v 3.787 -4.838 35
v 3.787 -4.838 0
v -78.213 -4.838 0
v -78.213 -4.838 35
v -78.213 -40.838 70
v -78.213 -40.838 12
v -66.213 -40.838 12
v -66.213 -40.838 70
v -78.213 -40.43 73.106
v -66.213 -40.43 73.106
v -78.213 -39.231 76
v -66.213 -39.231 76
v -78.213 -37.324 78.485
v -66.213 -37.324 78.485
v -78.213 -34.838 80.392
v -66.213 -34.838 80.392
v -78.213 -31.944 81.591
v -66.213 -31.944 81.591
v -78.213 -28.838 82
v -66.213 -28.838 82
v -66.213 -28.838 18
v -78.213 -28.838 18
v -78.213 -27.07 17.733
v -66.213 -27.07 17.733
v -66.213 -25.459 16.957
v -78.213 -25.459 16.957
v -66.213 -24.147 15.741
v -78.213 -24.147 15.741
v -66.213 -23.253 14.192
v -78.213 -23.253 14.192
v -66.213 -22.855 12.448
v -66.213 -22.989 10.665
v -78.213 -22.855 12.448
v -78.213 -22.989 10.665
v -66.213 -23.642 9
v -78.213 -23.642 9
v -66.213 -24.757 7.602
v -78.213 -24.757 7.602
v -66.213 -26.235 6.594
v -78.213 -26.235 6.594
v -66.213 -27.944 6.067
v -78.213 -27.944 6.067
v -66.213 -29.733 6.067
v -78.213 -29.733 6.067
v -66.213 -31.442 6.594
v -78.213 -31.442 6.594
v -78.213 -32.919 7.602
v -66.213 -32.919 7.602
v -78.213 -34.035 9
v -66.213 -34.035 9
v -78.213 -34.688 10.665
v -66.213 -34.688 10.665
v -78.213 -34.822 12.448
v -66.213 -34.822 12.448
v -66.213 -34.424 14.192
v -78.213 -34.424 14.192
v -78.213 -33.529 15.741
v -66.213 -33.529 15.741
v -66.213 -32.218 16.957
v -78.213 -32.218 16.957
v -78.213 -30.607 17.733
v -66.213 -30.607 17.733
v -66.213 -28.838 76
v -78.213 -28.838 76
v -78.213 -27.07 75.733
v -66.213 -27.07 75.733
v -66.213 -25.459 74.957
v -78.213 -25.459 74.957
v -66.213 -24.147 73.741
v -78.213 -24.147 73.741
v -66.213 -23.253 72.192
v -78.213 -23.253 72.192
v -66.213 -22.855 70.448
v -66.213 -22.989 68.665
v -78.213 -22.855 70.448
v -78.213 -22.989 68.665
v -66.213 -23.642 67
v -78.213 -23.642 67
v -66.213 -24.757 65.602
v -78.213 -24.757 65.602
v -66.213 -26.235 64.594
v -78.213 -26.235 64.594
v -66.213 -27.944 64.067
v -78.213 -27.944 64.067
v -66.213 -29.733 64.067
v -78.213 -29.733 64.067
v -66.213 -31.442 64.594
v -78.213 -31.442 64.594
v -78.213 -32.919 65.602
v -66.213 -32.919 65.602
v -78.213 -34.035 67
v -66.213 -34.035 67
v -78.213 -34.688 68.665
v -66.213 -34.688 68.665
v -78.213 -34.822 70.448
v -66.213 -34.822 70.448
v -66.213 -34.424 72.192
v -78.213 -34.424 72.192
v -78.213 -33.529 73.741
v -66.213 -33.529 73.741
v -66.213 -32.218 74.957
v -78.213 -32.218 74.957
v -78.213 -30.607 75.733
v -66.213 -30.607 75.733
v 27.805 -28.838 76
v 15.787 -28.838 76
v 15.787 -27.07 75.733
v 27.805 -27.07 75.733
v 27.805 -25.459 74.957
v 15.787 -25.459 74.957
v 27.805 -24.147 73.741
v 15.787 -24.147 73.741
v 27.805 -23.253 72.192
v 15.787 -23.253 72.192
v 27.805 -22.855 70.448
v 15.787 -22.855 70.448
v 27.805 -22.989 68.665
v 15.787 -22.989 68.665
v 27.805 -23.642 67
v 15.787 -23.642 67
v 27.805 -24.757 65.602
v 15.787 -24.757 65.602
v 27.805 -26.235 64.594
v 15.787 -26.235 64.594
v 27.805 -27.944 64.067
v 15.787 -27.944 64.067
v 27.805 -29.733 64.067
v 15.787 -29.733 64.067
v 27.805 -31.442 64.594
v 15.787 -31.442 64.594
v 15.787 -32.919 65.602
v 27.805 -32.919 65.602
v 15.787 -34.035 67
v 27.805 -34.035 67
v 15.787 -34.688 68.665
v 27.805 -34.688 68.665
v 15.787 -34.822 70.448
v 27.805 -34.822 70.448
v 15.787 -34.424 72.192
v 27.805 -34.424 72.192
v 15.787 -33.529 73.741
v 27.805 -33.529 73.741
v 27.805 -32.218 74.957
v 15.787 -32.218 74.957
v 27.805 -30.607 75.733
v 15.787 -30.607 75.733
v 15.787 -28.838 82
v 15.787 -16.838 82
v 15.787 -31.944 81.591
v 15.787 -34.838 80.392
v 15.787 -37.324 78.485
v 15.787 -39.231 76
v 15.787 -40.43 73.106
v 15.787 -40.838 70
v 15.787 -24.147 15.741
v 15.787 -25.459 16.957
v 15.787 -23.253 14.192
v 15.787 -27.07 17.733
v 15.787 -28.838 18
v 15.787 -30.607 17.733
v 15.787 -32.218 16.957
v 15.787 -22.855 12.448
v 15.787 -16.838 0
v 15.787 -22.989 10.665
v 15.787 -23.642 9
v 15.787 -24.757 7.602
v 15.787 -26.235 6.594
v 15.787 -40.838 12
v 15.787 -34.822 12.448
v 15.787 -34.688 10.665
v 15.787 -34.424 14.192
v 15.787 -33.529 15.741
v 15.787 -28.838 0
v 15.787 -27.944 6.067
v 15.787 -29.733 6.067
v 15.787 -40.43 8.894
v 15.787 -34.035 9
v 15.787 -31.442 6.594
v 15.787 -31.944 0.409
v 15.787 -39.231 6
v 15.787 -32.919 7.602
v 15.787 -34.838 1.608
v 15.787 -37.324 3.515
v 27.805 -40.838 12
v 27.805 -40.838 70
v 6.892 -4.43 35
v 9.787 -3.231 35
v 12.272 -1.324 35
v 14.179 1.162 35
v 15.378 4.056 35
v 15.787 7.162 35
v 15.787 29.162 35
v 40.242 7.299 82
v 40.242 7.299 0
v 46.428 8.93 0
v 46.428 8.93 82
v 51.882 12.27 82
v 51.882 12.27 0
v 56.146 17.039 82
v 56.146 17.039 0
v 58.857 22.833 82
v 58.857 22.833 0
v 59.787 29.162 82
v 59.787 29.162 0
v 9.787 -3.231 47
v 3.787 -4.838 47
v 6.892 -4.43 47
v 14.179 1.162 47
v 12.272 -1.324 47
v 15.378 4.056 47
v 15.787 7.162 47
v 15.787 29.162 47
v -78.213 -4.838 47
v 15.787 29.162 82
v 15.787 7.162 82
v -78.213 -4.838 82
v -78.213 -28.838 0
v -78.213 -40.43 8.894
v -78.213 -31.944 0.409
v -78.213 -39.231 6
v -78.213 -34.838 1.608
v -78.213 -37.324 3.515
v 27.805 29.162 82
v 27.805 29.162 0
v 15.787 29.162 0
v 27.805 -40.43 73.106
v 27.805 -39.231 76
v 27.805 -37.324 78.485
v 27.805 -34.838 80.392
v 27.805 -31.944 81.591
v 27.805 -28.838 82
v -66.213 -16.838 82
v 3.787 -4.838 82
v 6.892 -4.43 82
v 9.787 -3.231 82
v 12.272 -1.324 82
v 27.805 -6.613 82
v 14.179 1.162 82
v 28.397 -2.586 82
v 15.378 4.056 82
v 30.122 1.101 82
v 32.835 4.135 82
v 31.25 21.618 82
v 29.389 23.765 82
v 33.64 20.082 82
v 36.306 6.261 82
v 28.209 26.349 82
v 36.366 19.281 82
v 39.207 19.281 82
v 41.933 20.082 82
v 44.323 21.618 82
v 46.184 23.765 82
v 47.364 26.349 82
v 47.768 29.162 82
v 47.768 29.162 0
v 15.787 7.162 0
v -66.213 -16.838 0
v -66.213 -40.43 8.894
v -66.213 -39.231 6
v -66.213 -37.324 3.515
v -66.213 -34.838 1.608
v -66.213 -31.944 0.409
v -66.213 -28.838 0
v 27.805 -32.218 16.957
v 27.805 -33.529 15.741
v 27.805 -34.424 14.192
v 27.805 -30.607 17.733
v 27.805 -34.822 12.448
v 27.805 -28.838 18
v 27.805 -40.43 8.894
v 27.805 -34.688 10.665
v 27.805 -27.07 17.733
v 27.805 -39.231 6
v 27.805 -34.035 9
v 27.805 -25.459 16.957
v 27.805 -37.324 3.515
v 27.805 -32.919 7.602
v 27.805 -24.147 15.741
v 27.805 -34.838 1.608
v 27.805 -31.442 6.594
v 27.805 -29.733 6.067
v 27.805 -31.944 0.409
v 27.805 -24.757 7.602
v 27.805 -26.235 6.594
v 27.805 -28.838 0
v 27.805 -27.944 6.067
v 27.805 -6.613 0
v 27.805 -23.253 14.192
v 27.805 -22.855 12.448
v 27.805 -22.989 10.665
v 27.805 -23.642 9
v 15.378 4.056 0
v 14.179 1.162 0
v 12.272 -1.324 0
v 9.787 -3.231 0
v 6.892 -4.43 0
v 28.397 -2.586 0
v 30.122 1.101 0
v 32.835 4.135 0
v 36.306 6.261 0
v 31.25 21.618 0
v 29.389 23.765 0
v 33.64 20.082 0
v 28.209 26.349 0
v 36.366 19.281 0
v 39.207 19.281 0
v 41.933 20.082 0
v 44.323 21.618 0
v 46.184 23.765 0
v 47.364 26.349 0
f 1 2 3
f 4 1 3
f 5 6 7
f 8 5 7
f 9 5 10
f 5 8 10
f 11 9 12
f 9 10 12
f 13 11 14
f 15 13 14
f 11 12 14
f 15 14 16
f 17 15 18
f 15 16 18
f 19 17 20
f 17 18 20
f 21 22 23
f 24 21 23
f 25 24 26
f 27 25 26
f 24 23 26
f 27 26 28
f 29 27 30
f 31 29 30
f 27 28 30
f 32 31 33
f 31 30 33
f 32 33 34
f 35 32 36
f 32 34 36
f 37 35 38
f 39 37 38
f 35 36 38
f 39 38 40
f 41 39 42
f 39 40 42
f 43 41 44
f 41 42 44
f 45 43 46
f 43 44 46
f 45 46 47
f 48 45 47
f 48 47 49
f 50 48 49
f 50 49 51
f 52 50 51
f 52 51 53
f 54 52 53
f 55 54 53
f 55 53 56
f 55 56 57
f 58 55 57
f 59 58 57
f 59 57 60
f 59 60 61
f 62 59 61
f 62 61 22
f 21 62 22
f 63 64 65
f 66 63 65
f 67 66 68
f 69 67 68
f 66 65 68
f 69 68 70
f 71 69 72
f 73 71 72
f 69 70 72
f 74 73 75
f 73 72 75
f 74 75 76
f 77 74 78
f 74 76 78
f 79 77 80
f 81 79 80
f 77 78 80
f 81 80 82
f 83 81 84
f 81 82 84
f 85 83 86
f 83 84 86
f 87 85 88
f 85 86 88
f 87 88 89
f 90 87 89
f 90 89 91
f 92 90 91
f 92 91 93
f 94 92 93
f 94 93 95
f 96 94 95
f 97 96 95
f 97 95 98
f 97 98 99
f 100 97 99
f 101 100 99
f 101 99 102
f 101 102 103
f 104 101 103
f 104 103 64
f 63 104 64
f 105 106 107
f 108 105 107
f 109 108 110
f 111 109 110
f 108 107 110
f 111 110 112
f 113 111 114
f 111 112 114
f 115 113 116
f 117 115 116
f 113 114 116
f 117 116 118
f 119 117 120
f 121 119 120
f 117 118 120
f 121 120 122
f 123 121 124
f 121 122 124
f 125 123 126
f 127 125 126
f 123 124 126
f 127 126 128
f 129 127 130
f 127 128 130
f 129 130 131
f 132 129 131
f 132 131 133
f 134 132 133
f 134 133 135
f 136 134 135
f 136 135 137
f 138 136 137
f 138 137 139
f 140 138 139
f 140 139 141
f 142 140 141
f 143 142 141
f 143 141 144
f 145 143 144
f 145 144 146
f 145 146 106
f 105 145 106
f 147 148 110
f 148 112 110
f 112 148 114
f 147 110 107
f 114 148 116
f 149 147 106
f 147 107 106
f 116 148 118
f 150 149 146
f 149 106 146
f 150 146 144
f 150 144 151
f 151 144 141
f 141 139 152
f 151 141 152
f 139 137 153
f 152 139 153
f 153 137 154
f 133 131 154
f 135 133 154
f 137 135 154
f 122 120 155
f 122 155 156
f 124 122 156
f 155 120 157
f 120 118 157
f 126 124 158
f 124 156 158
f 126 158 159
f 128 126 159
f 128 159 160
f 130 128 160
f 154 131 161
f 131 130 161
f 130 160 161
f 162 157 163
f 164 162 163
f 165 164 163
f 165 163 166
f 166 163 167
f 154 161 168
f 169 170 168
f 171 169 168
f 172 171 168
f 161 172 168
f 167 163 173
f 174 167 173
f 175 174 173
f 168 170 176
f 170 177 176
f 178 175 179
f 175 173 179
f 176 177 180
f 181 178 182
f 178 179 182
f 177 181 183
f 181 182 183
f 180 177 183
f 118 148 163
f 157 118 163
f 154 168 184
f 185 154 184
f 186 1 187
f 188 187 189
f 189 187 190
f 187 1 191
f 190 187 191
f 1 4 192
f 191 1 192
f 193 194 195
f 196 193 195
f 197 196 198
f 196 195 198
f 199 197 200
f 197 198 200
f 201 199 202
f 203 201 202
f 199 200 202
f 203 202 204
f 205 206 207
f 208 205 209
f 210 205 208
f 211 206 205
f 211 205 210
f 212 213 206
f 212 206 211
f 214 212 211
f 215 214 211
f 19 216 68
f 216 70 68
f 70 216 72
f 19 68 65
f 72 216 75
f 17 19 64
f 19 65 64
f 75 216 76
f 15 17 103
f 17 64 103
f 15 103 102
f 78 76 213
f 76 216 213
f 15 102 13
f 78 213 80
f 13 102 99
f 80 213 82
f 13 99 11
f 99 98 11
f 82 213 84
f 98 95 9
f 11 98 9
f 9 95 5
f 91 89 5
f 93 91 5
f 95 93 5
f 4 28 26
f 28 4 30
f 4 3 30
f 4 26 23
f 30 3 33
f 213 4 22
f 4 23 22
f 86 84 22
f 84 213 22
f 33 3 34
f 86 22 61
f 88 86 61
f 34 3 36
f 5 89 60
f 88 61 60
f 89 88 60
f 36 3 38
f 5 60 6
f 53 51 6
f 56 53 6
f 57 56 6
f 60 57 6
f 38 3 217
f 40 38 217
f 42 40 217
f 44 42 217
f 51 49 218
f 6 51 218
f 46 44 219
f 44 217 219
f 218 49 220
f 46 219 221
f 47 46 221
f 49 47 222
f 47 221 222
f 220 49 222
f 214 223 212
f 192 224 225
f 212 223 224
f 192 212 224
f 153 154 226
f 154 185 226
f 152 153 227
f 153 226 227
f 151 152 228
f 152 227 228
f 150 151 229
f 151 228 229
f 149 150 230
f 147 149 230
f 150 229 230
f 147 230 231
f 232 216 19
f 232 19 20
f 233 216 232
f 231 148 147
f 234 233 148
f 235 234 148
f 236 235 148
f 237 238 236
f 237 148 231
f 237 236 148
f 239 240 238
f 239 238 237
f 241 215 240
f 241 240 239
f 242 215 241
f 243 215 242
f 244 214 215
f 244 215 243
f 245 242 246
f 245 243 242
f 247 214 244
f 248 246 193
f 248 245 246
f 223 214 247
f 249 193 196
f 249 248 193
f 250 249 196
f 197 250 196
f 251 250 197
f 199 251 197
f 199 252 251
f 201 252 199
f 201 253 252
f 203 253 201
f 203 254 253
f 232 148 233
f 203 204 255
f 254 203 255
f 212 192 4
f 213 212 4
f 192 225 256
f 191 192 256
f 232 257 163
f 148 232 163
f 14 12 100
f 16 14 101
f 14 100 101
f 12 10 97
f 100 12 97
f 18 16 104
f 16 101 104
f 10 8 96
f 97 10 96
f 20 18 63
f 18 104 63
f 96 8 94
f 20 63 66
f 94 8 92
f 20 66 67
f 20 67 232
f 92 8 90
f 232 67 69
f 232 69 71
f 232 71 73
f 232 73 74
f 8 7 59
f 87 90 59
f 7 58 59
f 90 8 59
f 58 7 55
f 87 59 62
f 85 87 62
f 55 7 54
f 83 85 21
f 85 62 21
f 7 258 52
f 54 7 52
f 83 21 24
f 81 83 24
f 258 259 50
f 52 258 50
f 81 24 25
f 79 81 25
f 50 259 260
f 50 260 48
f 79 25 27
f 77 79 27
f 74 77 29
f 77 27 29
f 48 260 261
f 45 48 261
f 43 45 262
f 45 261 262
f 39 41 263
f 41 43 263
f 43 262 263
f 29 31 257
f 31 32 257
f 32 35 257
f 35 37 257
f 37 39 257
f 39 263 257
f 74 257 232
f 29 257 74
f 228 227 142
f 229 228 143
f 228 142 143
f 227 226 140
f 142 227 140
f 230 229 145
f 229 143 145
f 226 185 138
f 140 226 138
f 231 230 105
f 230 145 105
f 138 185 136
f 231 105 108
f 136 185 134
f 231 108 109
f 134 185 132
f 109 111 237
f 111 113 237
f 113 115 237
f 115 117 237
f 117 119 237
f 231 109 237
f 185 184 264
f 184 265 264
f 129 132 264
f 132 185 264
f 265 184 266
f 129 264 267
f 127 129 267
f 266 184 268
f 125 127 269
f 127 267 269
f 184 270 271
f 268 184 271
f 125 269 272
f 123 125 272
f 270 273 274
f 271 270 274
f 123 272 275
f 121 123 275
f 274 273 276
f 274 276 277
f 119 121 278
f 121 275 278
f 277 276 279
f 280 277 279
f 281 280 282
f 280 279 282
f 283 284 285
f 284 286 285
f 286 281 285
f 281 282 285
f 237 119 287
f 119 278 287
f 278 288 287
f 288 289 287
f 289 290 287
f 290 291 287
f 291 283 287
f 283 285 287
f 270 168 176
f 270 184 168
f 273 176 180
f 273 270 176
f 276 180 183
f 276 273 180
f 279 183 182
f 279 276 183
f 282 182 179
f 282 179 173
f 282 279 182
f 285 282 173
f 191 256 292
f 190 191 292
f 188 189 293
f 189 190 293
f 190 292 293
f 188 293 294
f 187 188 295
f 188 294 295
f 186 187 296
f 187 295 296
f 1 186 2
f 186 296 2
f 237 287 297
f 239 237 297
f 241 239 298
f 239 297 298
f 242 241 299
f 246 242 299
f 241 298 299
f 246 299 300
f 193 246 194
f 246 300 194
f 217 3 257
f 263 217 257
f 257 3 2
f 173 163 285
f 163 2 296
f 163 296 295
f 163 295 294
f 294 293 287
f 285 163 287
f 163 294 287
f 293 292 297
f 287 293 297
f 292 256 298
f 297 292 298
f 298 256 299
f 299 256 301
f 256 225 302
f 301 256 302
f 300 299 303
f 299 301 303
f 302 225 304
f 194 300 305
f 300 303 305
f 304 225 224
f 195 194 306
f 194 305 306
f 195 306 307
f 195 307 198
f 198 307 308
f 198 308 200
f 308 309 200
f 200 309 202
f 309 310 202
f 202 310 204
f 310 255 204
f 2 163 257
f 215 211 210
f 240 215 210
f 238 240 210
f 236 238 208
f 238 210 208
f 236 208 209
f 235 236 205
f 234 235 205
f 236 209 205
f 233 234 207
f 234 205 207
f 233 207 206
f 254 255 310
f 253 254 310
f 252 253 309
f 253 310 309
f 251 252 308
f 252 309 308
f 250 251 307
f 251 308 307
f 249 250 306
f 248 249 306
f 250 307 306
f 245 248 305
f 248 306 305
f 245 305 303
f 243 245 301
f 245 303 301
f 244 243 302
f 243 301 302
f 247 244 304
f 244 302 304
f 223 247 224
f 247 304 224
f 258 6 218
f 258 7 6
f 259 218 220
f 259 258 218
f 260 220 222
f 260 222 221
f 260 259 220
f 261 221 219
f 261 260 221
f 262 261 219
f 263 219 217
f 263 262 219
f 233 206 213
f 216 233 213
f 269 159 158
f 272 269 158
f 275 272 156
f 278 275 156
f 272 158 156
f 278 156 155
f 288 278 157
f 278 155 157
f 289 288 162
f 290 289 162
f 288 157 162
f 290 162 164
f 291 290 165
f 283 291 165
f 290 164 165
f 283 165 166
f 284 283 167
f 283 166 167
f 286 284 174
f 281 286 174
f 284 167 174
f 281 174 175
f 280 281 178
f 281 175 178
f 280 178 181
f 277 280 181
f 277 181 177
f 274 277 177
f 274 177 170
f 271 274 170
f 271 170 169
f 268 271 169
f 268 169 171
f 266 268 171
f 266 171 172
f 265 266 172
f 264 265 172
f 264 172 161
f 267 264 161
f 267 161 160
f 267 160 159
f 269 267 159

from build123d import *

# Parameters (mm, degrees)
Y_KSEKLIK_EKSTR_ZYON1_DEPTH      = 82
RADYUS1_R                        = 12
IZIM5_R                          = 6
KES_EKSTR_ZYON3_DEPTH            = 107
Y_KSEKLIK_EKSTR_ZYON2_DEPTH      = 6
Y_KSEKLIK_EKSTR_ZYON2_DEPTH_BACK = 6


with BuildPart() as part:
    # Çizim1 → Yükseklik-Ekstrüzyon1 (new body)
    with BuildSketch(Plane.XY):
        with BuildLine():
            Line((-78.213413995, -40.838458766), (-66.213413995, -40.838458766))
            Line((-66.213413995, -40.838458766), (-66.213413995, -16.838458766))
            Line((-66.213413995, -16.838458766), (15.786586005, -16.838458766))
            Line((15.786586005, -16.838458766), (15.786586005, -40.838458766))
            Line((15.786586005, -40.838458766), (27.804920328, -40.838458766))
            Line((27.804920328, -40.838458766), (27.804920328, -6.613491809))
            ThreePointArc((27.804920328, -6.613491809), (31.367545227, 2.717167386), (40.242234758, 7.299021041))
            ThreePointArc((40.242234758, 7.299021041), (54.188175449, 14.499076785), (59.786586005, 29.161541234))
            Line((59.786586005, 29.161541234), (47.768251683, 29.161541234))
            ThreePointArc((47.768251683, 29.161541234), (37.786586005, 19.179875557), (27.804920328, 29.161541234))
            Line((27.804920328, 29.161541234), (15.786586005, 29.161541234))
            Line((15.786586005, 29.161541234), (15.786586005, 7.161541234))
            ThreePointArc((15.786586005, 7.161541234), (12.271867379, -1.32374014), (3.786586005, -4.838458766))
            Line((3.786586005, -4.838458766), (-78.213413995, -4.838458766))
            Line((-78.213413995, -4.838458766), (-78.213413995, -40.838458766))
        make_face()
    extrude(amount=Y_KSEKLIK_EKSTR_ZYON1_DEPTH)

    # Radyus1
    radyus1_edges = [part.edges().sort_by_distance(p)[0] for p in [
        (21.795753166, -40.838458766, 0),
        (-72.213413995, -40.838458766, 0),
        (21.795753166, -40.838458766, 82),
        (-72.213413995, -40.838458766, 82),
    ]]
    fillet(radyus1_edges, radius=RADYUS1_R)

    # Çizim5 → Kes-Ekstrüzyon3 (cut)
    with BuildSketch(Plane.ZY.offset(78.213413995)):
        with Locations((12, -28.838458766)):
            Circle(IZIM5_R)
        with Locations((70, -28.838458766)):
            Circle(IZIM5_R)
    extrude(amount=-KES_EKSTR_ZYON3_DEPTH, mode=Mode.SUBTRACT)

    # Çizim8 → Yükseklik-Ekstrüzyon2 (add, two sides: drawn at the far end of the back side and taken through both)
    with BuildSketch(Plane.XY.offset(41).offset(-Y_KSEKLIK_EKSTR_ZYON2_DEPTH_BACK)):
        with BuildLine():
            Line((15.786586005, 29.161541234), (-78.213413995, -4.838458766))
            Line((-78.213413995, -4.838458766), (3.786586005, -4.838458766))
            ThreePointArc((3.786586005, -4.838458766), (12.271867379, -1.32374014), (15.786586005, 7.161541234))
            Line((15.786586005, 7.161541234), (15.786586005, 29.161541234))
        make_face()
    extrude(amount=Y_KSEKLIK_EKSTR_ZYON2_DEPTH + Y_KSEKLIK_EKSTR_ZYON2_DEPTH_BACK)


solid = part.part
